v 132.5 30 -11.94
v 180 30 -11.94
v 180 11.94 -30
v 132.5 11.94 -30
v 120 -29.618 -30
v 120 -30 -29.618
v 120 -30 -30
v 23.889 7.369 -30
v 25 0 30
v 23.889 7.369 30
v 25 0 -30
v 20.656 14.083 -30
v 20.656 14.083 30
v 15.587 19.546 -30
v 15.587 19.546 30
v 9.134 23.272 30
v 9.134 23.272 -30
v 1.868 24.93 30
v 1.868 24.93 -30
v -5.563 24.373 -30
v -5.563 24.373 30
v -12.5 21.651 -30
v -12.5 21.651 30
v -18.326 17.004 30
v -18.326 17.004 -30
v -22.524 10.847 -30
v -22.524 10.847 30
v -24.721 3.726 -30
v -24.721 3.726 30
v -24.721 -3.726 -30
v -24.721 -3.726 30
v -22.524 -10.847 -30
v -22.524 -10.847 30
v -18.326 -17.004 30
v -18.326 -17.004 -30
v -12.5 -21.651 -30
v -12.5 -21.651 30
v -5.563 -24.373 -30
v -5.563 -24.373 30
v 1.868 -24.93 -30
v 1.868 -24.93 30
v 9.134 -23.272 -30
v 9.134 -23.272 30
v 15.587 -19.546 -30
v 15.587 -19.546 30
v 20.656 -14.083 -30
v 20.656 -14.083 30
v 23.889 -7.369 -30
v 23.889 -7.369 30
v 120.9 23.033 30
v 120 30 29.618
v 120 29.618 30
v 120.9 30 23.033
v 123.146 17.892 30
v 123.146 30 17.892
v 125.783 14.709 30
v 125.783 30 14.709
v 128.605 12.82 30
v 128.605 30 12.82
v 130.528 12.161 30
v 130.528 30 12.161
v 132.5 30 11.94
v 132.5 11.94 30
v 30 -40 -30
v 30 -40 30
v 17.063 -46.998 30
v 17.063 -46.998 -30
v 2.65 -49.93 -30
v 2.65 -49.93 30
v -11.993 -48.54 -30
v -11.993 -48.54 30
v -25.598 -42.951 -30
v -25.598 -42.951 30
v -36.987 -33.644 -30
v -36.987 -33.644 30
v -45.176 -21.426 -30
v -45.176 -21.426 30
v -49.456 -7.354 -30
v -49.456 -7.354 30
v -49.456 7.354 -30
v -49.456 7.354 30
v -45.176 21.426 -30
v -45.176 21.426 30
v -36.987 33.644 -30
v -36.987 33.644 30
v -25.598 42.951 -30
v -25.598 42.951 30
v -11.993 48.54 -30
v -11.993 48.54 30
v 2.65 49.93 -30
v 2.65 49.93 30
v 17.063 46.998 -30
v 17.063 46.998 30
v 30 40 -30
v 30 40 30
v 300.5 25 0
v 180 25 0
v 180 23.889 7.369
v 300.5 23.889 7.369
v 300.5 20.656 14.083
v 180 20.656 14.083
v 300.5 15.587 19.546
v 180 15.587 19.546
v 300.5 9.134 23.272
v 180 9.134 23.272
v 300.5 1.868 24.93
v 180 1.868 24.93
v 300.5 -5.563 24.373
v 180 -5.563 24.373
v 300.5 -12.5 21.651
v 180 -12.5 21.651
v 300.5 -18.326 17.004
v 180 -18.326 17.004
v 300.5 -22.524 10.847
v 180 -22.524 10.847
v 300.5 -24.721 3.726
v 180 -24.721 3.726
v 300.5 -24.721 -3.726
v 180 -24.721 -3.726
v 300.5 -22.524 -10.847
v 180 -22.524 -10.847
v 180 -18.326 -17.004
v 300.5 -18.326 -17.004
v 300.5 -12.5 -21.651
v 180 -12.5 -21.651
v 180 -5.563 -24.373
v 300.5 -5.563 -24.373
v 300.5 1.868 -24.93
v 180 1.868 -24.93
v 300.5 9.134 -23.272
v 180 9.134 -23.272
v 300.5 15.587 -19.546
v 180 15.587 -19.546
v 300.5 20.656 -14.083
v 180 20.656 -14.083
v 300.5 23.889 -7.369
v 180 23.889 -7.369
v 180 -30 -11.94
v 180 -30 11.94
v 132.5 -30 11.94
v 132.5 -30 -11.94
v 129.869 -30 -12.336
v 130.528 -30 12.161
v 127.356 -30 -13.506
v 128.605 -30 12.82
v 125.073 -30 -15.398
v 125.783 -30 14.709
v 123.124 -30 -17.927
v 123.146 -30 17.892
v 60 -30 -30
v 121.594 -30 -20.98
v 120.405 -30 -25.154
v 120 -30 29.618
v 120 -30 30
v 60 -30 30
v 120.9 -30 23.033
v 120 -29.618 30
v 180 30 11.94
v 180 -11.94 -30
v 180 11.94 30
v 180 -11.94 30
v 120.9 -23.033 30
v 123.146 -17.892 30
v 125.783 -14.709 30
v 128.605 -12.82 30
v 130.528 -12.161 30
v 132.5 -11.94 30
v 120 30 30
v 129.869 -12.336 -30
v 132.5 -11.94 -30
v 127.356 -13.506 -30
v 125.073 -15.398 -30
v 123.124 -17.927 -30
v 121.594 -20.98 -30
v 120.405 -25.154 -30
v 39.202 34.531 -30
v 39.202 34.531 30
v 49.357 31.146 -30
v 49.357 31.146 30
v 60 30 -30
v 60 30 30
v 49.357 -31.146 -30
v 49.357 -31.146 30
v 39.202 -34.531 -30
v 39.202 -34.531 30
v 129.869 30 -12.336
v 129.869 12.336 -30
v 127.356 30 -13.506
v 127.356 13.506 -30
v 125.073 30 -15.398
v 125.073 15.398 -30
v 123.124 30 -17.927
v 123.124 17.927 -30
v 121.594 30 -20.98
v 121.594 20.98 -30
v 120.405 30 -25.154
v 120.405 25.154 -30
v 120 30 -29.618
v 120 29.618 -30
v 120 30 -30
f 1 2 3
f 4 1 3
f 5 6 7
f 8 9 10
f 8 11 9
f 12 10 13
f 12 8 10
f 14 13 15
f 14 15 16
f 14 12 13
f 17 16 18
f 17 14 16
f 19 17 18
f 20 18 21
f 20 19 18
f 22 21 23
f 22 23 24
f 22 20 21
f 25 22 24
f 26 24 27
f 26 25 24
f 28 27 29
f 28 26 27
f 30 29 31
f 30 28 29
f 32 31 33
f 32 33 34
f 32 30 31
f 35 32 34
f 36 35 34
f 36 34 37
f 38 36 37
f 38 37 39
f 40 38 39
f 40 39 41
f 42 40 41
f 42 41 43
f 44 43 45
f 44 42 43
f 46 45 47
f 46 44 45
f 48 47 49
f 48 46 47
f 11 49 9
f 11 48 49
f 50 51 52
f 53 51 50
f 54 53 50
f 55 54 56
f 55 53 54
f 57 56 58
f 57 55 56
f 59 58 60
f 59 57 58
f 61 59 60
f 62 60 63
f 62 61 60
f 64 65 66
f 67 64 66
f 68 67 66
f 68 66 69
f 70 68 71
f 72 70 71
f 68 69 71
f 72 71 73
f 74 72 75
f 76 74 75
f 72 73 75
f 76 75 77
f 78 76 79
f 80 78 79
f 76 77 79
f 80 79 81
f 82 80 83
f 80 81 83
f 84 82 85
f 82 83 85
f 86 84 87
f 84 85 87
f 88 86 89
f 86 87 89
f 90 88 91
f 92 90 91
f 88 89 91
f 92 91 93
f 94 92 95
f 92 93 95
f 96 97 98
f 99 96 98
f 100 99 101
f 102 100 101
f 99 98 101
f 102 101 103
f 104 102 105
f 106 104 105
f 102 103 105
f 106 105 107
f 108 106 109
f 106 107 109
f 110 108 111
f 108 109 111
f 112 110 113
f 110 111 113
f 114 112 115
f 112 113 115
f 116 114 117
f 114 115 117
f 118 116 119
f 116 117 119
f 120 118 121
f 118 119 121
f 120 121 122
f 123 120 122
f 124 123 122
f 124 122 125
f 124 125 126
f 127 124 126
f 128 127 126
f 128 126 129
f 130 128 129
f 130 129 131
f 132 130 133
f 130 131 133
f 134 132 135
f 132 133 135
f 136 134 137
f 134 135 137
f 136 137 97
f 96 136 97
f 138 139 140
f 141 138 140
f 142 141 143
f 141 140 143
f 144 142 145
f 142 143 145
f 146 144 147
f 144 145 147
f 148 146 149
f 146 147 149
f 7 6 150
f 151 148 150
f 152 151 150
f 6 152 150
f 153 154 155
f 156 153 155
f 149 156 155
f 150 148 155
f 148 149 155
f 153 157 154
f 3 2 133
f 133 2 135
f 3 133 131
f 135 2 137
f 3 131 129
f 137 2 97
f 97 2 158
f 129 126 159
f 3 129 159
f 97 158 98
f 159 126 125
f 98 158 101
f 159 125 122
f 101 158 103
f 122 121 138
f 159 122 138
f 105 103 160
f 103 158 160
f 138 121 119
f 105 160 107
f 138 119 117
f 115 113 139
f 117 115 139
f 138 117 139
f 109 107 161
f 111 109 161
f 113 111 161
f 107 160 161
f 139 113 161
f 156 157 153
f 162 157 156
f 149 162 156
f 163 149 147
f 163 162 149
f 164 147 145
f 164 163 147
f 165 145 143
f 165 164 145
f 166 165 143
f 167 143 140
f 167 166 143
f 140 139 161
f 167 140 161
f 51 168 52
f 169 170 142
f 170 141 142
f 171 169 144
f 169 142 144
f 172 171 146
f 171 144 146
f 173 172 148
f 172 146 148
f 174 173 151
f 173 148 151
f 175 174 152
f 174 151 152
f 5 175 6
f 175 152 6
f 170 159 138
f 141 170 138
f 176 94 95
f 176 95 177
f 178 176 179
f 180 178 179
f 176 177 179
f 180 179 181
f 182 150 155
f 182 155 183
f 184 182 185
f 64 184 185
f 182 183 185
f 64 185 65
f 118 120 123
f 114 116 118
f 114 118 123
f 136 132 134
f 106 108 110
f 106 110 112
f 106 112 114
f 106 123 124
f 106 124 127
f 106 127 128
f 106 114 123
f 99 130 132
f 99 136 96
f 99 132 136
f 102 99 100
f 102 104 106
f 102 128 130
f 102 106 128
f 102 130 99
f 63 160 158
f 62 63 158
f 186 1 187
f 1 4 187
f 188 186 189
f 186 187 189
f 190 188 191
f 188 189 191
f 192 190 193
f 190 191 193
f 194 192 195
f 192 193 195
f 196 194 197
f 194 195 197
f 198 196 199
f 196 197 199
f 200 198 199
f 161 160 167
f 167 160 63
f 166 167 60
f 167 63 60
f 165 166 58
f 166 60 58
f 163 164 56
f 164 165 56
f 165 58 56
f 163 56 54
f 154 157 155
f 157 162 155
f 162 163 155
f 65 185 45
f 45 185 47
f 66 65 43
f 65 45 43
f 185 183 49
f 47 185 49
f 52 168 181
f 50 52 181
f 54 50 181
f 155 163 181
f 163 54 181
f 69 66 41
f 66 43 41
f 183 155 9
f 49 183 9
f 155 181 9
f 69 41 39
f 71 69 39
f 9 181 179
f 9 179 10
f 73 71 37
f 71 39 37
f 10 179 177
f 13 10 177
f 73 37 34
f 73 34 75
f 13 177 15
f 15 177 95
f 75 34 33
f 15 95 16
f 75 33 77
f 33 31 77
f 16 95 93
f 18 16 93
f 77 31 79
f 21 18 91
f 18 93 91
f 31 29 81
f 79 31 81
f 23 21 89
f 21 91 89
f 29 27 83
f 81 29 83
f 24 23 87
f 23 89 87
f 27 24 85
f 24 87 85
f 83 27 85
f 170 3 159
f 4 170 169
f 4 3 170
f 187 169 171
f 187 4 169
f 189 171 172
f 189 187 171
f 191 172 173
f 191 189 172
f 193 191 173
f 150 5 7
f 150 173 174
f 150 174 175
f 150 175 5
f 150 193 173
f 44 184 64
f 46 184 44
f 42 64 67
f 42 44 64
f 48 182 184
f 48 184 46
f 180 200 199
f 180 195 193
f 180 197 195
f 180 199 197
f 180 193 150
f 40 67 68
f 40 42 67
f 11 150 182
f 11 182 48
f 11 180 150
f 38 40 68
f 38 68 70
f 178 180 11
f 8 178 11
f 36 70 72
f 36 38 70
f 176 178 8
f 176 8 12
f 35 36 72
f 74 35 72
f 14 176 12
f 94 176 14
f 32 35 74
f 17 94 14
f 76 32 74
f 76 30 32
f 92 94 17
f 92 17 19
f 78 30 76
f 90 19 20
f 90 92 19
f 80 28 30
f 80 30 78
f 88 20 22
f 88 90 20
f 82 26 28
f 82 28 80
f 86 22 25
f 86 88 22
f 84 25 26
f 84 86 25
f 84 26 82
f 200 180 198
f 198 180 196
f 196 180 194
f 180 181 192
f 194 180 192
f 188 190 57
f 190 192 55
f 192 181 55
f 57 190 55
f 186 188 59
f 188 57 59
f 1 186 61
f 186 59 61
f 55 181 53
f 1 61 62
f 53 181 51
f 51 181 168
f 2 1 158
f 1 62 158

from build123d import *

# Parameters (mm, degrees)
SKETCH1_R           = 25
BOSS_EXTRUDE1_DEPTH = 30
CUT_EXTRUDE1_DEPTH  = 60
SKETCH2_3_R         = 25
BOSS_EXTRUDE2_DEPTH = 120.5
FILLET1_R           = 12.5


with BuildPart() as part:
    # Sketch1 → Boss-Extrude1 (new, symmetric)
    with BuildSketch(Plane.XY):
        with BuildLine():
            Line((60, 30), (180, 30))
            Line((180, 30), (180, -30))
            Line((180, -30), (60, -30))
            ThreePointArc((60, -30), (44.188611699, -32.565835097), (30, -40))
            ThreePointArc((30, -40), (-50, 0), (30, 40))
            ThreePointArc((30, 40), (44.188611699, 32.565835097), (60, 30))
        make_face()
        Circle(SKETCH1_R, mode=Mode.SUBTRACT)
    extrude(amount=BOSS_EXTRUDE1_DEPTH, both=True)

    # Sketch2 → Cut-Extrude1 (cut)
    with BuildSketch(Plane(origin=(180, 0, 0), x_dir=(0, 0, -1), z_dir=(1, 0, 0))):
        Polygon((11.94, 30), (30, 11.94), (30, 30), align=None)
        Polygon((30, -30), (30, -11.94), (11.94, -30), align=None)
        Polygon((-30, 11.94), (-11.94, 30), (-30, 30), align=None)
        Polygon((-30, -30), (-11.94, -30), (-30, -11.94), align=None)
    extrude(amount=-CUT_EXTRUDE1_DEPTH, mode=Mode.SUBTRACT)

    # Sketch2<3> → Boss-Extrude2 (add)
    with BuildSketch(Plane(origin=(180, 0, 0), x_dir=(0, 0, -1), z_dir=(1, 0, 0))):
        Circle(SKETCH2_3_R)
    extrude(amount=BOSS_EXTRUDE2_DEPTH)

    # Fillet1
    fillet1_edges = [part.edges().sort_by_distance(p)[0] for p in [
        (120, -20.97, -20.97),
        (120, 20.97, -20.97),
        (120, -20.97, 20.97),
        (120, 20.97, 20.97),
    ]]
    fillet(fillet1_edges, radius=FILLET1_R)


solid = part.part
